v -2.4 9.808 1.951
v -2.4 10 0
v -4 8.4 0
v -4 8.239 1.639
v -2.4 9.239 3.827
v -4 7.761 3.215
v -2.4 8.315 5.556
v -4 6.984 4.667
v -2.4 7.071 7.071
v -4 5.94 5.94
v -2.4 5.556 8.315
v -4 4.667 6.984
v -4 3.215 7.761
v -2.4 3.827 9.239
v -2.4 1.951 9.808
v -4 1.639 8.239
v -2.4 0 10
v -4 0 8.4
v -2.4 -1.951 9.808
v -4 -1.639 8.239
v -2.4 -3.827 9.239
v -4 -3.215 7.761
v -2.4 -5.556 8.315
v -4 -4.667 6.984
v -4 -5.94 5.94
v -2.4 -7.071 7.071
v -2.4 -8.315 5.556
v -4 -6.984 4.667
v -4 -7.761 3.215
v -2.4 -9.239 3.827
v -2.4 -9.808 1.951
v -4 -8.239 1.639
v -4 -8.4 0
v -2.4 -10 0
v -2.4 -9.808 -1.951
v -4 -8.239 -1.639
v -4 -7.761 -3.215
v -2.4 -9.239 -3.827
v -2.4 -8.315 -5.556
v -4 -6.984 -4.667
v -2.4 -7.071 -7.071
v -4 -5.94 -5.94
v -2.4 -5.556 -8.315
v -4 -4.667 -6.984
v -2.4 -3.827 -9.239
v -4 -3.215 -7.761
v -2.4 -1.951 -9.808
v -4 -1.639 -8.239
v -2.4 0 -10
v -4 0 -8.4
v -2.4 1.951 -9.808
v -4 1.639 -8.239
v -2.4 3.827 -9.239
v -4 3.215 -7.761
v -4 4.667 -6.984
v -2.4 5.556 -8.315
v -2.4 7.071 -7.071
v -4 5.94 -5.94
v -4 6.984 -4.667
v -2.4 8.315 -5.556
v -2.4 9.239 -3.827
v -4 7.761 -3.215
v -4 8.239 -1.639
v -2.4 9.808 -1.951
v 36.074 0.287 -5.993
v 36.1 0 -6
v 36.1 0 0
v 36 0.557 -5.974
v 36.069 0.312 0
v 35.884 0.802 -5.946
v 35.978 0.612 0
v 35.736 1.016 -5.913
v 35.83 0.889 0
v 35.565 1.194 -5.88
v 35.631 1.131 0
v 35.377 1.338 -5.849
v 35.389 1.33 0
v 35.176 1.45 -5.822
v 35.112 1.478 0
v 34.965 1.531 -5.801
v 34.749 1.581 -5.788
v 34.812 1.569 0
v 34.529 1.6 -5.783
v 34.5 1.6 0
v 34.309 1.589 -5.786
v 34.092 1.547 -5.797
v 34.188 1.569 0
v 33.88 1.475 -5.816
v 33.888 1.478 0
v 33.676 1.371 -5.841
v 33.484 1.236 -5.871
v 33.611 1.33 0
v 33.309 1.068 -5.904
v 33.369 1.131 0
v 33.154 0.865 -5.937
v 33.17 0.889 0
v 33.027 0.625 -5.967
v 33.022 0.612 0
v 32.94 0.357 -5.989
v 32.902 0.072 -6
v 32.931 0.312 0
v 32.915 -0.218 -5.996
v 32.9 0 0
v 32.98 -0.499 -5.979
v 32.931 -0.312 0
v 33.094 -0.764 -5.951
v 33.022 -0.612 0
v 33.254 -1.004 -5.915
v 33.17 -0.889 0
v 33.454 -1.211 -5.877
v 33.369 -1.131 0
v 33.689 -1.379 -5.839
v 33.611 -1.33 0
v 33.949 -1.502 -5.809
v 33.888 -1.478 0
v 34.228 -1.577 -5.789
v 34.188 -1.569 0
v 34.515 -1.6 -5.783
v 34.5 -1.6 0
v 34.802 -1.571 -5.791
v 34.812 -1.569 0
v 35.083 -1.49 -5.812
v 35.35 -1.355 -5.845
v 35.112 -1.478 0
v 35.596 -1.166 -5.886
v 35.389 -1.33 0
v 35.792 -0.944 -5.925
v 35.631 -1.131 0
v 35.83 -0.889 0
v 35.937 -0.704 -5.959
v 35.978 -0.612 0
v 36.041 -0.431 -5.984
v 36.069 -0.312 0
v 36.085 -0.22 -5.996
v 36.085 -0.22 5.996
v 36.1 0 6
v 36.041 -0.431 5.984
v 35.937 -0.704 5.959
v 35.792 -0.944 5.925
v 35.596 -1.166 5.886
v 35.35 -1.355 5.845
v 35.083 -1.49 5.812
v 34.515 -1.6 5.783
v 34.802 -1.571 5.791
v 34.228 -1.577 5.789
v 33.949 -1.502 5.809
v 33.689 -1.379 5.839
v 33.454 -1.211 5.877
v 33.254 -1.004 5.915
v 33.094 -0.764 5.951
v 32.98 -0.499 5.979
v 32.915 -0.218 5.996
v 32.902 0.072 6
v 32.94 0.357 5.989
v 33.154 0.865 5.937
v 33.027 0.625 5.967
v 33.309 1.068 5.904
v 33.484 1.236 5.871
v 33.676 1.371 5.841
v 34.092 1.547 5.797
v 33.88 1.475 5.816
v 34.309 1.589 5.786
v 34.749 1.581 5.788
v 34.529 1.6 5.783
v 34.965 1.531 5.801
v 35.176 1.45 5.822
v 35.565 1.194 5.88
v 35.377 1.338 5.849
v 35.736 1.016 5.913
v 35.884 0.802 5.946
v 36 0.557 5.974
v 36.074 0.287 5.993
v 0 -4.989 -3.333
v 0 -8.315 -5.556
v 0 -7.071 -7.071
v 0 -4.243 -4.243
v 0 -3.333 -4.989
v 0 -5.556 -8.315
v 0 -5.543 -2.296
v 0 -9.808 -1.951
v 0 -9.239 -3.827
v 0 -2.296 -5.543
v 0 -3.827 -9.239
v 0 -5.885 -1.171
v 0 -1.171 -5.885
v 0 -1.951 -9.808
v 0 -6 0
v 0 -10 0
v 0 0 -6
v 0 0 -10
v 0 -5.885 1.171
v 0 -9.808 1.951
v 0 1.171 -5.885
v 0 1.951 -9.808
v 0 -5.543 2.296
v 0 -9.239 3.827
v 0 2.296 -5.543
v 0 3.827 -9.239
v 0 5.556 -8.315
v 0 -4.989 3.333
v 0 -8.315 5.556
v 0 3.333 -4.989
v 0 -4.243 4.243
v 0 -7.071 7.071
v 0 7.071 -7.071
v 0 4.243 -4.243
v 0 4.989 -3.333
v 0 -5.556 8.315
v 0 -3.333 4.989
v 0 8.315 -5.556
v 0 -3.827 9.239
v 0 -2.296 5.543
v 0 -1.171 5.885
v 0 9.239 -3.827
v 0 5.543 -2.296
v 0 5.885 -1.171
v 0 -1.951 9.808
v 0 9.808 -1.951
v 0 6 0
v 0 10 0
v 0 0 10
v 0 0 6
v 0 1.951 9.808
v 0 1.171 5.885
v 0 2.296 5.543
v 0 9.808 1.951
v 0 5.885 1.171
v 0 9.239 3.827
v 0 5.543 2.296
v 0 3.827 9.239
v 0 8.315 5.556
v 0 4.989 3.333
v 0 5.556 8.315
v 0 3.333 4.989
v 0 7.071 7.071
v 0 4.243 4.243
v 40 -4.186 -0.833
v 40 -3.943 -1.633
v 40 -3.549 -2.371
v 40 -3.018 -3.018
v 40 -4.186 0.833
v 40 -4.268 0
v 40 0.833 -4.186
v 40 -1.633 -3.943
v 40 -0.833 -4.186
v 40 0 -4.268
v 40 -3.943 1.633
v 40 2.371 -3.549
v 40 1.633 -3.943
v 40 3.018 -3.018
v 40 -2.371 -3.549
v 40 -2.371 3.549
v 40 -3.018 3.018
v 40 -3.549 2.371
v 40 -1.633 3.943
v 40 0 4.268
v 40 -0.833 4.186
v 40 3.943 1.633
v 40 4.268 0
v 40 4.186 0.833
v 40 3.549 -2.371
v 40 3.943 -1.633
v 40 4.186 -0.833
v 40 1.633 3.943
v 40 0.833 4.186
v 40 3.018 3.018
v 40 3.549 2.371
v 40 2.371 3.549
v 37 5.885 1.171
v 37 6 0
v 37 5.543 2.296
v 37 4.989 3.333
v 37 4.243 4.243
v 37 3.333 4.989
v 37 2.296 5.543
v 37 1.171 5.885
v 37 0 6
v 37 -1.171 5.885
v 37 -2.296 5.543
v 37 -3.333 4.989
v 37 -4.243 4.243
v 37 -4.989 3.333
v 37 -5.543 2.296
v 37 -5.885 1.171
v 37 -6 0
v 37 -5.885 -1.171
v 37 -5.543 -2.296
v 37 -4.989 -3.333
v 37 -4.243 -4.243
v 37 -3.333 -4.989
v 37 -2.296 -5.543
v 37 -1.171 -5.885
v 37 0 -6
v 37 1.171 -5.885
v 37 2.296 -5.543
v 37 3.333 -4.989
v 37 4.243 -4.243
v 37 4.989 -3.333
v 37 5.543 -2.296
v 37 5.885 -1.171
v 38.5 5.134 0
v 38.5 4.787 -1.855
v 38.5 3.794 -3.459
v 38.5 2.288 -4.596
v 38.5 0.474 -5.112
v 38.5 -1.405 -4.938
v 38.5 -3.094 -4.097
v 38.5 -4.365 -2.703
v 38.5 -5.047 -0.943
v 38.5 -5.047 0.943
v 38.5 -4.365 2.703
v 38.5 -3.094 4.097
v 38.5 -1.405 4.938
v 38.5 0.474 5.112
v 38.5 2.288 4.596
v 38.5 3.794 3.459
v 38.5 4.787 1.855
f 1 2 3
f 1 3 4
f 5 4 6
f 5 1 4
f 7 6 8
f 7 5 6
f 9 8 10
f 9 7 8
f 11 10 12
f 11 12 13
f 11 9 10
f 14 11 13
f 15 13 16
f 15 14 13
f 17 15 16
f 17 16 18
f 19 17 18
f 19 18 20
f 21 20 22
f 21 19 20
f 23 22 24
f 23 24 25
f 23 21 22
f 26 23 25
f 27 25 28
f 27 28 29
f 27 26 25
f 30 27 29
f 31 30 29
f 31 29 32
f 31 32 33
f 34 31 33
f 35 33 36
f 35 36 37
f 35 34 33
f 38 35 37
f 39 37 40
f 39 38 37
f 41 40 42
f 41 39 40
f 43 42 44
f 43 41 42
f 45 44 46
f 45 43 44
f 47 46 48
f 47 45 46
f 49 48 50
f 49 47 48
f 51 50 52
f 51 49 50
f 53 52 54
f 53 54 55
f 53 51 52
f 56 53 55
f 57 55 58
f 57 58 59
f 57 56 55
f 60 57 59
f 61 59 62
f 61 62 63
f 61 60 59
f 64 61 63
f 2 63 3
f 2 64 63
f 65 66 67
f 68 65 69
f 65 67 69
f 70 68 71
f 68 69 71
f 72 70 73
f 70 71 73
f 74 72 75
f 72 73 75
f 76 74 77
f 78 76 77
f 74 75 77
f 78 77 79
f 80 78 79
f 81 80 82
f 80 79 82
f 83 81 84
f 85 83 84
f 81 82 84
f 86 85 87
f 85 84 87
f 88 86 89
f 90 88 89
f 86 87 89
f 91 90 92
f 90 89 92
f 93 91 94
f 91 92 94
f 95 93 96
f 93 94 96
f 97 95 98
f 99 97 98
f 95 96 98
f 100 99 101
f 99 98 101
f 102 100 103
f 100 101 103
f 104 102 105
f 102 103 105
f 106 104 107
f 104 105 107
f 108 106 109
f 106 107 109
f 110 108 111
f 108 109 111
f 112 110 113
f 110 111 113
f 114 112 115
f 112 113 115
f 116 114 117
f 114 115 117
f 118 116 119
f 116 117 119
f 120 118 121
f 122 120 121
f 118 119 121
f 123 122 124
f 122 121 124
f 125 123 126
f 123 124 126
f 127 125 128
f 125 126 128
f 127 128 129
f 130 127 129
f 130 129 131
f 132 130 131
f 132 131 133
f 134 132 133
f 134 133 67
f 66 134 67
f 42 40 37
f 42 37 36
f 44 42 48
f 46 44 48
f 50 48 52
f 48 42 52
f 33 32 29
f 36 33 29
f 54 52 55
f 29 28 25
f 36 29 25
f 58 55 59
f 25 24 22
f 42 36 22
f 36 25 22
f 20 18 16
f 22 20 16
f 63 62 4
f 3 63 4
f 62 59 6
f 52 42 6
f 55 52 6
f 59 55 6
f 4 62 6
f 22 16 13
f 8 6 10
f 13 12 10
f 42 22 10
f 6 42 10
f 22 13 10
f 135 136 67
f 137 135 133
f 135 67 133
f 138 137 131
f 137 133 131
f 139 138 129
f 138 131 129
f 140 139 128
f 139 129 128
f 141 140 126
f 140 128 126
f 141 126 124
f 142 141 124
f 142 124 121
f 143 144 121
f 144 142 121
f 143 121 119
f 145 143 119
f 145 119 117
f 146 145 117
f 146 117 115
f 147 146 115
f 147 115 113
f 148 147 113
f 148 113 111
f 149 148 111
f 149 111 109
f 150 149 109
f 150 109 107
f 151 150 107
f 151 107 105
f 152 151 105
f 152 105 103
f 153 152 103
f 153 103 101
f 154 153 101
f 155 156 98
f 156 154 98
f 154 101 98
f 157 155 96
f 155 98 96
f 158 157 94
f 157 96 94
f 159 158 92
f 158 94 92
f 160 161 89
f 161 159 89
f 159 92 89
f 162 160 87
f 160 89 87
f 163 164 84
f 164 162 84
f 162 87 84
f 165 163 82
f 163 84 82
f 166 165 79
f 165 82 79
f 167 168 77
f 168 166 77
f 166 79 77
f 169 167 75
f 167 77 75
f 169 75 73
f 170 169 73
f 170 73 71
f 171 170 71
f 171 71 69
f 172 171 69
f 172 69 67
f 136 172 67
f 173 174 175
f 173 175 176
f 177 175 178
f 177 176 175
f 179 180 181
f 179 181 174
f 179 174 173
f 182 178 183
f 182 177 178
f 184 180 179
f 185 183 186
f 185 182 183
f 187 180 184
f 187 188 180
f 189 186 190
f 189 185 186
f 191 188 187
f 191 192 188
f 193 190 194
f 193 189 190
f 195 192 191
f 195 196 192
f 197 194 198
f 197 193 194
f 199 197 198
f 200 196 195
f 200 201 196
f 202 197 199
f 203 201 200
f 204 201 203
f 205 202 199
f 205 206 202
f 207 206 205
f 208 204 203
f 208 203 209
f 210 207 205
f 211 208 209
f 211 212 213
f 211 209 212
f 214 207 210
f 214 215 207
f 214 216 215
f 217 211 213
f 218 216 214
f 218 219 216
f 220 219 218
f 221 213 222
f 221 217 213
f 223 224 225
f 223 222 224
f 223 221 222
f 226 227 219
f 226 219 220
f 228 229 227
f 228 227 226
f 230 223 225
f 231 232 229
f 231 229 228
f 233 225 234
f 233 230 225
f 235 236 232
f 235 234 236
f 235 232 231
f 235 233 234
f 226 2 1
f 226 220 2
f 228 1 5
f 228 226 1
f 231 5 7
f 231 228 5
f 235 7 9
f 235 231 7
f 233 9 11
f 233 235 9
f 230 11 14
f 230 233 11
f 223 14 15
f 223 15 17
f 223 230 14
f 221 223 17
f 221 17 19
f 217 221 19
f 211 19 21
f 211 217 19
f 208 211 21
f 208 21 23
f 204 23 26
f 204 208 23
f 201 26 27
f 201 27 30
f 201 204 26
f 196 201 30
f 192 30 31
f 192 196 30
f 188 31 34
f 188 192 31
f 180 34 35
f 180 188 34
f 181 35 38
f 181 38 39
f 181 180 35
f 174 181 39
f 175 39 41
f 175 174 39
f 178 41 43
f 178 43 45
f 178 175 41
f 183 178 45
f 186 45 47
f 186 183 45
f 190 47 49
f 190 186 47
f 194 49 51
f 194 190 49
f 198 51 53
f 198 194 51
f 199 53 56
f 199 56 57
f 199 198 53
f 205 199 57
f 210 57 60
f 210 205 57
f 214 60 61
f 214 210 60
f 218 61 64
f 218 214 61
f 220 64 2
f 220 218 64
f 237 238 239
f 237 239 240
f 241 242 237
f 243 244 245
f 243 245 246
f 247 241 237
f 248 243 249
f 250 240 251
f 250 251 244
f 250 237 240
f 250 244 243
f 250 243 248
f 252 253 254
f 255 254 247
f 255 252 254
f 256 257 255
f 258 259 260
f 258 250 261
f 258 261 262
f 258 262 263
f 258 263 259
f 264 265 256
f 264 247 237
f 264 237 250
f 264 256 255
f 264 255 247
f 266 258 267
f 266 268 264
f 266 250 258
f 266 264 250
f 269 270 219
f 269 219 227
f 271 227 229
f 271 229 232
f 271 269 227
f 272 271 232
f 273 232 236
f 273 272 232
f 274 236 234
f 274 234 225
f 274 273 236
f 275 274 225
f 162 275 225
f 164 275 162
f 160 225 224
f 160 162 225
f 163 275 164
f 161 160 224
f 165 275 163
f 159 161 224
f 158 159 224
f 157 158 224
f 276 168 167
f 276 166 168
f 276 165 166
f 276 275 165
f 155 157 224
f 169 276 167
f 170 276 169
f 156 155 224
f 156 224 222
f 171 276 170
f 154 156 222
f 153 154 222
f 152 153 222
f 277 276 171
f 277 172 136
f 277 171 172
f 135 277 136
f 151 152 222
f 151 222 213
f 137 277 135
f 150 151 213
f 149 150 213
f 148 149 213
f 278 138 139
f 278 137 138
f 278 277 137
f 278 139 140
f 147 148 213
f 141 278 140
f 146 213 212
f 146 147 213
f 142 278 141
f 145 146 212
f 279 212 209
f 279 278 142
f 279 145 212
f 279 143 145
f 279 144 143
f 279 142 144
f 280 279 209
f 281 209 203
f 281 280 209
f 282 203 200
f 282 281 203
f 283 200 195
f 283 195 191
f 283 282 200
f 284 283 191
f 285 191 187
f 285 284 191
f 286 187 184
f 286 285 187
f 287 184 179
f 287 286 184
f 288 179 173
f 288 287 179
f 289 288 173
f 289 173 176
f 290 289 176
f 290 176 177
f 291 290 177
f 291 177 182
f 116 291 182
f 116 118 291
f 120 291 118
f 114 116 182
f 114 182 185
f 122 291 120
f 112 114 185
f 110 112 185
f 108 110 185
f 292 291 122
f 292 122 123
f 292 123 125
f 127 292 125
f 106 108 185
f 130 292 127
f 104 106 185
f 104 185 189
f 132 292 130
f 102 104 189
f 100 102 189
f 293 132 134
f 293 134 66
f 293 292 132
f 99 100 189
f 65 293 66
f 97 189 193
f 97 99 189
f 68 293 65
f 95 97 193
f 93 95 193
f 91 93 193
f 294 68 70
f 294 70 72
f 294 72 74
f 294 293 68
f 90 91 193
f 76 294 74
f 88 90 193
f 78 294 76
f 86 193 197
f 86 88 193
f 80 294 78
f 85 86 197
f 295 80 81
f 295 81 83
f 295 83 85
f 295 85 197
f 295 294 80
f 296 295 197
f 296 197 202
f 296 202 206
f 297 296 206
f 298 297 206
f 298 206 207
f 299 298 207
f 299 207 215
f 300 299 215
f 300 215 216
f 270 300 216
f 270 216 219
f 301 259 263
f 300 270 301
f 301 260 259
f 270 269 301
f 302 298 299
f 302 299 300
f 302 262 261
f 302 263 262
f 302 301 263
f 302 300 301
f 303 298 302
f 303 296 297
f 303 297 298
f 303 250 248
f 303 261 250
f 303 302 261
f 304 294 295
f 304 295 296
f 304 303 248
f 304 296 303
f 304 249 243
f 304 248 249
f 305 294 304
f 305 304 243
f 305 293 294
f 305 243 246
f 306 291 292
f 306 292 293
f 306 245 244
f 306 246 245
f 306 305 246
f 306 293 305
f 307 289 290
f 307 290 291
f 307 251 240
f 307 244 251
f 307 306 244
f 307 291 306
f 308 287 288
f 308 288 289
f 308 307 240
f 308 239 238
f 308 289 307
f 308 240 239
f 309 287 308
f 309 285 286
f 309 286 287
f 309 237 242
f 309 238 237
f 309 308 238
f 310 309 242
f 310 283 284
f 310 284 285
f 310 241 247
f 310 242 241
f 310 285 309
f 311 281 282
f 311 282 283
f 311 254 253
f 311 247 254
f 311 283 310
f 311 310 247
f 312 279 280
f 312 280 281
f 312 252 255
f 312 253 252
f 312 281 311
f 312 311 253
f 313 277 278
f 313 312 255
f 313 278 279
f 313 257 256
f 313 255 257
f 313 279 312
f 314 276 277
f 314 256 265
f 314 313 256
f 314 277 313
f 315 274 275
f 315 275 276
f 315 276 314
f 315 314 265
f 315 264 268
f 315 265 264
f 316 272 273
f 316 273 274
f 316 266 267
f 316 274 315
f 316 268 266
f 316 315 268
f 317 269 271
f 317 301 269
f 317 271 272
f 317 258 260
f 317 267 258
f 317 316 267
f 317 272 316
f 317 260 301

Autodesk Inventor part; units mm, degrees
ref_plane "YZ Plane" through (0, 0, 0) normal (1, 0, 0) x (0, 1, 0)
ref_plane "XZ Plane" through (0, 0, 0) normal (0, 1, 0) x (-1, 0, 0)
sketch "Skizze1" plane through (0, 0, 0) normal (0, 0, 1) x (1, 0, 0)
  line L0 (-4, 0) -> (-4, 10)
  line L1 (-4, 10) -> (0, 10)
  line L2 (0, 10) -> (0, 6)
  line L3 (0, 6) -> (40, 6)
  line L4 (40, 6) -> (40, 0)
  line L5 (-4, 0) -> (40, 0)
  line L6 (-4, 0) -> (17, 0) projected
  line L7 (0, -0.98) -> (0, 3.08) projected
  circle A0 centre (34.5, 0) radius 1.6
  dimension "d0" = 12
  dimension "d1" = 20
  dimension "d2" = 4
  dimension "d3" = 40
  dimension "d5" = 5.5
  dimension "d6" = 3.2
revolve "Körper" add sketch "Skizze1" angle 360 about axis through (-4, 0, 0) along (1, 0, 0) picked at (34.8992, 0.6089) contours L0 L1 L2 L3 L4 L5 A0 | A0 L5
extrude "Bohrung" cut sketch "Skizze1" along normal through all both and the other way through all contours A0 L5 | L5 A0
chamfer "Fase1" distance 1.6 angle 45 1 edges at (-4, -10, 0) measured on face at (-2.6667, 9.9676, -0.8047)
chamfer "Fase2" distance 3 angle 30 1 edges at (40, -6, 0) measured on face at (13.3333, 5.9805, -0.4828)
ref_plane "Work Plane1" through (20, 0, 6) normal (0, 0, 1) x (1, 0, 0)
equation "\"d0\" = NND"
equation "\"d1\" = KOD"
equation "\"d2\" = KOH"
equation "\"d3\" = NLG"
equation "\"d5\" = DIST"
equation "\"d6\" = BOR"
equation "\"d7\" = NND"
equation "\"d9\" = PHH2"
equation "\"d10\" = FAWI2"
equation "\"d16\" = PHH2"
equation "\"d11\" = PHH1"
equation "\"d12\" = FAWI1"
equation "\"d17\" = PHH1"
equation "\"PHH1\" = 3"
equation "\"PHH2\" = 1.6"
equation "\"KOD\" = 20"
equation "\"KOH\" = 4"
equation "\"NND\" = 12"
equation "\"FAWI1\" = 30deg"
equation "\"FAWI2\" = 45deg"
equation "\"DIST\" = 5.5"
equation "\"BOR\" = 3.2"
equation "\"NLG\" = 40"
properties part number "IS 6863 - B12 x 40" material "Stahl, weich"
